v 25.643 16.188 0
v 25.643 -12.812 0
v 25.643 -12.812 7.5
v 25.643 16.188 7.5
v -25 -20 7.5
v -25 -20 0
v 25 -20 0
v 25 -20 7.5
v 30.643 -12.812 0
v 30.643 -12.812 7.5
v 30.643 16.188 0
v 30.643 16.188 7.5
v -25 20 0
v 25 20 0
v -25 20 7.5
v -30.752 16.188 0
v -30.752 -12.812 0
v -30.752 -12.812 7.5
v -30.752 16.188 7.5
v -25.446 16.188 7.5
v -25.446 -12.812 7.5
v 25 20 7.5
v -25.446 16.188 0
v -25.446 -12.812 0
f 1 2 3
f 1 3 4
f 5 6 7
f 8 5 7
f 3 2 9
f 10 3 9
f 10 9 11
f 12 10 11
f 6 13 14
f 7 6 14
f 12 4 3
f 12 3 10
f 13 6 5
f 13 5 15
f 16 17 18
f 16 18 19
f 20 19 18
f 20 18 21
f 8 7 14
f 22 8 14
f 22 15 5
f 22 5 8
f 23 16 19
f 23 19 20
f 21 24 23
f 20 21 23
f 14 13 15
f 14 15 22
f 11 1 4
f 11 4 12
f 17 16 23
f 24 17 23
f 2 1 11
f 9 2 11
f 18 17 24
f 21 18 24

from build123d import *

# Parameters (mm, degrees)
F0_W     = 50
F0_H     = 40
F1_DEPTH = 7.5
F2_W     = 5.306279
F2_H     = 29.000013
F2_W_2   = 5
F3_DEPTH = 7.5


with BuildPart() as f1:
    # F0 (on Top) → F1 (new body)
    with BuildSketch(Plane.XY):
        Rectangle(F0_W, F0_H)
    extrude(amount=F1_DEPTH)


with BuildPart() as f3:
    # F2 (on Top) → F3 (new body)
    with BuildSketch(Plane.XY):
        with Locations((-28.099159, 1.688362)):
            Rectangle(F2_W, F2_H)
        with Locations((28.142624, 1.688362)):
            Rectangle(F2_W_2, F2_H)
    extrude(amount=F3_DEPTH)


solid = Compound([f1.part, f3.part])
